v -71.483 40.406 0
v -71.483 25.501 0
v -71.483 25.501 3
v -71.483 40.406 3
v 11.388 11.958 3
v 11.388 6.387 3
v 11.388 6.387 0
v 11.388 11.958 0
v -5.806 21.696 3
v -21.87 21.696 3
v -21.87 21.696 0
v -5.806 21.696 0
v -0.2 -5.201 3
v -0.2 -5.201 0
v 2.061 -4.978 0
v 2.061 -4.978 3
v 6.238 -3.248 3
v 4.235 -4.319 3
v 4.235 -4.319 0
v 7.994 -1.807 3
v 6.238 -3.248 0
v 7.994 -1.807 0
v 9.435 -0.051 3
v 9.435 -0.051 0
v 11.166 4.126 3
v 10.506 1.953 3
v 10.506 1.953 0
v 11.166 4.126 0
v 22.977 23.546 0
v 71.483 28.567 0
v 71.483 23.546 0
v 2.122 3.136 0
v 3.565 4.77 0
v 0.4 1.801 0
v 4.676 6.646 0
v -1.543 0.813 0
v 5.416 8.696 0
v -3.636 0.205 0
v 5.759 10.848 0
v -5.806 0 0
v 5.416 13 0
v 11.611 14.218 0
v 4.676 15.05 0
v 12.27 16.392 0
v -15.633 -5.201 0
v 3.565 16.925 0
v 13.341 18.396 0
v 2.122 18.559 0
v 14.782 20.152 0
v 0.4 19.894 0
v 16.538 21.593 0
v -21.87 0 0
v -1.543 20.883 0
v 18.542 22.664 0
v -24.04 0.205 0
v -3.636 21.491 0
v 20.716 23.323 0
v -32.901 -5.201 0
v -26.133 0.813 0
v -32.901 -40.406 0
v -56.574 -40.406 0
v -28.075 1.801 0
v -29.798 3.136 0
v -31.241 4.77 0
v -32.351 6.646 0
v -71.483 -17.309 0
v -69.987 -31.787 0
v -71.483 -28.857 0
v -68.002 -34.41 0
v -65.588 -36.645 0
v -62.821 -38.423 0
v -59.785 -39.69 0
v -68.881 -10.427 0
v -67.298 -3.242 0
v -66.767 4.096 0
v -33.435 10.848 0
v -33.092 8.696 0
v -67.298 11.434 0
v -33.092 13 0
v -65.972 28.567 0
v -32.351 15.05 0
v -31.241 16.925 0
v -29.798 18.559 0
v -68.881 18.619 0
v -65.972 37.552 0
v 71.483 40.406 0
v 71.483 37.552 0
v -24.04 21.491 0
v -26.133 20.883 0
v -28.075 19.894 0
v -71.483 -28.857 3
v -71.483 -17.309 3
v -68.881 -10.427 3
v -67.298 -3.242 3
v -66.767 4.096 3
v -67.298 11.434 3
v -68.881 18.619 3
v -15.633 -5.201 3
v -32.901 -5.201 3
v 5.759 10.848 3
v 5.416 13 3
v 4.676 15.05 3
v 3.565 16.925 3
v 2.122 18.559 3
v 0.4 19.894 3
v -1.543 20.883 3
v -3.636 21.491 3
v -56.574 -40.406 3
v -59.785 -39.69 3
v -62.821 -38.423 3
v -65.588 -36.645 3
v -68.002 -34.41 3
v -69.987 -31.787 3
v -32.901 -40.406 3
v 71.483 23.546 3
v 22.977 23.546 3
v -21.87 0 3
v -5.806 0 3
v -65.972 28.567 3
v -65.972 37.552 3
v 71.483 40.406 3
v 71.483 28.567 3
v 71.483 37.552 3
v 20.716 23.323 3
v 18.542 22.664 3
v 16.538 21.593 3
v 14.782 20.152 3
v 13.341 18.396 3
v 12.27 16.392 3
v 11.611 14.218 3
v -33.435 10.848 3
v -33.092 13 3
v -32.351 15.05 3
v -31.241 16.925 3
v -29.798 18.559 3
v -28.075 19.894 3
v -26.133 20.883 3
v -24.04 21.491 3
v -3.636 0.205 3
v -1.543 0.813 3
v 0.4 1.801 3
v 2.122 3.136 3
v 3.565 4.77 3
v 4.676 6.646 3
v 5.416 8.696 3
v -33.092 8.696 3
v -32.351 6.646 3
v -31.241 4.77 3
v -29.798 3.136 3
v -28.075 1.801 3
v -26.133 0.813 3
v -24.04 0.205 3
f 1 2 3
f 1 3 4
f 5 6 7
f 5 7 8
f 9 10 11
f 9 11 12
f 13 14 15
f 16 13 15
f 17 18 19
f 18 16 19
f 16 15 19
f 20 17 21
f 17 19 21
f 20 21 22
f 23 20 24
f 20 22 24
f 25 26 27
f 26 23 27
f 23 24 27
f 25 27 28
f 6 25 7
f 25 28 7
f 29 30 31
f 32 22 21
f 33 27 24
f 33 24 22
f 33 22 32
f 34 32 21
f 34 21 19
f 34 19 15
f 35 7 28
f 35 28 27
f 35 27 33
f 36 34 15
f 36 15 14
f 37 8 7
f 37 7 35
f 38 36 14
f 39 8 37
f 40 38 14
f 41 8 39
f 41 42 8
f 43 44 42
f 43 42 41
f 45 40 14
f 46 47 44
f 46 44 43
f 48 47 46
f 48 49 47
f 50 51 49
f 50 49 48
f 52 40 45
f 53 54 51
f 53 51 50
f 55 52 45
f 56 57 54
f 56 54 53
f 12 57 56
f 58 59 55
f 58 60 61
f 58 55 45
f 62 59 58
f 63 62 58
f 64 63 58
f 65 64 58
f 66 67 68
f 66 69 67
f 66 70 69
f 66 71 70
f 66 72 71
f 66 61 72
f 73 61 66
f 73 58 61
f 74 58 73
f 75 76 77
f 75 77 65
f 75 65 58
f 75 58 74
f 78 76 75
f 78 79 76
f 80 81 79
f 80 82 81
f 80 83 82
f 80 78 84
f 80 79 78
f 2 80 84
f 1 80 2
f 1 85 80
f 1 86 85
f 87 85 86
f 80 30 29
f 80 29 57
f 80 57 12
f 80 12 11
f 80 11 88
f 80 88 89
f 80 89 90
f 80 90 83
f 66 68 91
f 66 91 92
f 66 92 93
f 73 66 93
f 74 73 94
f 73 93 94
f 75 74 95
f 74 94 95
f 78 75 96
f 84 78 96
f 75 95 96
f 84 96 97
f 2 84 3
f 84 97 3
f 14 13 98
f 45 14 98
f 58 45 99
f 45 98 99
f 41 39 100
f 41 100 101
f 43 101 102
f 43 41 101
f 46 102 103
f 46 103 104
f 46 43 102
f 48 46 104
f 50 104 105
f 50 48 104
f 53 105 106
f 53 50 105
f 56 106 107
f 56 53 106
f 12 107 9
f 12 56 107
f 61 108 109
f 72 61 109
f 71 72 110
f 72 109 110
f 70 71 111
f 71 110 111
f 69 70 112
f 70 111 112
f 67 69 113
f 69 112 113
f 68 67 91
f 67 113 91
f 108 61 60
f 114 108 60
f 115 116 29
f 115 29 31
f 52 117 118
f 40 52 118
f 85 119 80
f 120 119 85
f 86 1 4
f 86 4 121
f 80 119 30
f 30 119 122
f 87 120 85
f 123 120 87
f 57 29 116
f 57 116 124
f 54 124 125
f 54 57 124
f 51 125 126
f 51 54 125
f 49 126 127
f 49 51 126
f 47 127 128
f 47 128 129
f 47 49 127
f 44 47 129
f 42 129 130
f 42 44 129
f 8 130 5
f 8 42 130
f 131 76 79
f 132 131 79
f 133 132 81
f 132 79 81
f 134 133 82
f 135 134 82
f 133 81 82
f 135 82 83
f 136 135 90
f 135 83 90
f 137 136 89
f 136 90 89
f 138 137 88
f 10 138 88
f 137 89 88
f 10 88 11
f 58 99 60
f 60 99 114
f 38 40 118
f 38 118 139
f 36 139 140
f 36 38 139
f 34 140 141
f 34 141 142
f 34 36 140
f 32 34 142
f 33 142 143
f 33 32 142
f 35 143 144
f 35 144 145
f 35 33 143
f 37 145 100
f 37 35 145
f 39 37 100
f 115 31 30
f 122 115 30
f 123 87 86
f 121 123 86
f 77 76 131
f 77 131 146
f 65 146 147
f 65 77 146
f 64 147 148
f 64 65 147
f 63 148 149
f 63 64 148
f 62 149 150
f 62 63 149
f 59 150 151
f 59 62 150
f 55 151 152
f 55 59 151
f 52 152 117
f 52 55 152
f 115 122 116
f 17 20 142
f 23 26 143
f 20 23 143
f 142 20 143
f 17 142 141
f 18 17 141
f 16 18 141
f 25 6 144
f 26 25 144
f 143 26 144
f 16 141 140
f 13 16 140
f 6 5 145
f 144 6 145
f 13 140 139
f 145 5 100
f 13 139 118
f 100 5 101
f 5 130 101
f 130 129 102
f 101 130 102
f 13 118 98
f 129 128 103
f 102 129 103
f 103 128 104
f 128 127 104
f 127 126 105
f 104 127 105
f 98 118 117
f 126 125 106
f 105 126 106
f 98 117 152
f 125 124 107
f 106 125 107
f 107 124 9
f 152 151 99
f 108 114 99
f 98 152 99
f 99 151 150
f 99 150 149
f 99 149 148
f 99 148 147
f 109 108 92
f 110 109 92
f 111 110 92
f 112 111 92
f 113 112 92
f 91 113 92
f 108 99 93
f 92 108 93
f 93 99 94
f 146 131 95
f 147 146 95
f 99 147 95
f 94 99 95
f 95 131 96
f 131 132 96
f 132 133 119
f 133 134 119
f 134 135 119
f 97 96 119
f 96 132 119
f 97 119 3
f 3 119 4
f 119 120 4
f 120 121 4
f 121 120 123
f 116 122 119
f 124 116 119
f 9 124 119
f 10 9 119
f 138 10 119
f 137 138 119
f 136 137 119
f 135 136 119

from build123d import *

# Parameters (mm, degrees)
F0_W         = 142.9656147957
F0_H         = 80.8112323284
F1_DEPTH     = 3
F2_W         = 137.4550536275
F2_H         = 8.9848991483
F2_W_2       = 60.0944850594
F2_H_2       = 18.4983238578
F3_DEPTH     = 52.3
F4_W         = 39.2408655025
F4_H         = 21.6958951205
F5_DEPTH     = 25
F6_W         = 3.3521875739
F6_H         = 44.7733802721
F6_W_2       = 40.9712046385
F7_DEPTH     = 25
F8_W         = 102.604271844
F8_H         = 18.422623165
F9_DEPTH     = 25
F10_T1_DEPTH = 3
F10_T3_DEPTH = 60.941125497
F12_DEPTH    = 25
F14_DEPTH    = 25
F16_DEPTH    = 25


# Not quite as in the source:
# - a fillet or chamfer that OpenCascade refuses, or shapes differently, is made with other operations: its cross-section is extruded or revolved along the edge and cut away or added


with BuildPart() as f1:
    # F0 (on Top) → F1 (new body)
    with BuildSketch(Plane.XY):
        Rectangle(F0_W, F0_H)
    extrude(amount=F1_DEPTH)

    # F2 (on face) → F3 (cut)
    with BuildSketch(Plane.XY.offset(3)):
        with Locations((2.7552805841, 33.0591509119)):
            Rectangle(F2_W, F2_H)
        with Locations((41.4355648682, 14.2965670675)):
            Rectangle(F2_W_2, F2_H_2)
    extrude(amount=-F3_DEPTH, mode=Mode.SUBTRACT)

    # F4 (on face) → F5 (cut)
    with BuildSketch(Plane.XY.offset(3)):
        with Locations((-13.8379565906, 10.8479475603)):
            Rectangle(F4_W, F4_H)
    extrude(amount=-F5_DEPTH, mode=Mode.SUBTRACT)

    # F6 (on face) → F7 (cut)
    with BuildSketch(Plane.XY.offset(3)):
        Polygon((98.6725464463, 0), (13.7504395097, 0), (13.7504395097, -5.2010240033), (17.1026270837, -5.2010240033), (17.1026270837, -49.9744042754), (13.7504395097, -49.9744042754), (13.7504395097, -55.2418604493), (98.6725464463, -55.2418604493), align=None)
        with Locations((15.4265332967, -27.5877141394)):
            Rectangle(F6_W, F6_H)
        with Locations((-6.7351628095, -27.5877141394)):
            Rectangle(F6_W_2, F6_H)
    extrude(amount=-F7_DEPTH, mode=Mode.SUBTRACT)

    # F8 (on face) → F9 (cut)
    with BuildSketch(Plane.XY.offset(3)):
        with Locations((62.6904582605, -4.1639064439)):
            Rectangle(F8_W, F8_H)
    extrude(amount=-F9_DEPTH, mode=Mode.SUBTRACT)

    # F10: fillet of radius 11.5882250994 on 7 edges, made by hand

    # F10_s2 → F10_t1 (join)
    with BuildSketch(Plane.XY):
        with BuildLine():
            ThreePointArc((22.9765474379, 23.5457289964), (14.7824348882, 20.1516164467), (11.3883223385, 11.957503897))
            Line((11.3883223385, 11.957503897), (11.3883223385, 23.5457289964))
            Line((11.3883223385, 23.5457289964), (22.9765474379, 23.5457289964))
        make_face()
        with BuildLine():
            ThreePointArc((-15.6325400293, -5.2010240033), (-23.826652579, -8.595136553), (-27.2207651287, -16.7892491027))
            Line((-27.2207651287, -16.7892491027), (-27.2207651287, -5.2010240033))
            Line((-27.2207651287, -5.2010240033), (-15.6325400293, -5.2010240033))
        make_face()
        with BuildLine():
            ThreePointArc((-33.4583893418, 10.1076700211), (-30.0642767921, 18.3017825708), (-21.8701642424, 21.6958951205))
            Line((-21.8701642424, 21.6958951205), (-33.4583893418, 21.6958951205))
            Line((-33.4583893418, 21.6958951205), (-33.4583893418, 10.1076700211))
        make_face()
        with BuildLine():
            ThreePointArc((-5.8057489387, 0), (2.388363611, 3.3941125497), (5.7824761607, 11.5882250994))
            Line((5.7824761607, 11.5882250994), (5.7824761607, 0))
            Line((5.7824761607, 0), (-5.8057489387, 0))
        make_face()
        with BuildLine():
            ThreePointArc((-33.4583893418, 11.5882250994), (-30.0642767921, 3.3941125497), (-21.8701642424, 0))
            Line((-21.8701642424, 0), (-33.4583893418, 0))
            Line((-33.4583893418, 0), (-33.4583893418, 11.5882250994))
        make_face()
        with BuildLine():
            ThreePointArc((5.7824761607, 10.1076700211), (2.388363611, 18.3017825708), (-5.8057489387, 21.6958951205))
            Line((-5.8057489387, 21.6958951205), (5.7824761607, 21.6958951205))
            Line((5.7824761607, 21.6958951205), (5.7824761607, 10.1076700211))
        make_face()
    extrude(amount=F10_T1_DEPTH)

    # F10_s4 → F10_t3 (cut)
    with BuildSketch(Plane.XY.offset(-28.9705627485)):
        with BuildLine():
            ThreePointArc((-0.1999027609, -5.2010240033), (7.9942097888, -1.8069114536), (11.3883223385, 6.3872010961))
            Line((11.3883223385, 6.3872010961), (11.3883223385, -5.2010240033))
            Line((11.3883223385, -5.2010240033), (-0.1999027609, -5.2010240033))
        make_face()
    extrude(amount=F10_T3_DEPTH, mode=Mode.SUBTRACT)

    # F11 (on face) → F12 (cut)
    with BuildSketch(Plane.XY.offset(3)):
        with BuildLine():
            Line((-71.4828073978, 25.5012605339), (-71.4828073978, -17.3091441393))
            ThreePointArc((-71.4828073978, -17.3091441393), (-66.7668008007, 4.0960581973), (-71.4828073978, 25.5012605339))
        make_face()
    extrude(amount=-F12_DEPTH, mode=Mode.SUBTRACT)

    # F13 (on face) → F14 (cut)
    with BuildSketch(Plane.XY.offset(3)):
        with BuildLine():
            ThreePointArc((-21.3245461018, -6.6952891353), (-30.1185964093, -13.4662376926), (-27.2207651287, -24.1799503565))
            Line((-27.2207651287, -24.1799503565), (-27.2207651287, -16.7892491027))
            ThreePointArc((-27.2207651287, -16.7892491027), (-25.6387183355, -10.944306275), (-21.3245461018, -6.6952891353))
        make_face()
        with BuildLine():
            ThreePointArc((-27.2207651287, -32.8327932205), (-29.4171017882, -37.101902666), (-32.9005867243, -40.4056161642))
            Line((-32.9005867243, -40.4056161642), (-27.2207651287, -40.4056161642))
            Line((-27.2207651287, -40.4056161642), (-27.2207651287, -32.8327932205))
        make_face()
        with BuildLine():
            ThreePointArc((-56.574376872, -40.4056161642), (-65.5880780241, -36.6447482344), (-71.4828073978, -28.8573801517))
            Line((-71.4828073978, -28.8573801517), (-71.4828073978, -40.4056161642))
            Line((-71.4828073978, -40.4056161642), (-56.574376872, -40.4056161642))
        make_face()
    extrude(amount=-F14_DEPTH, mode=Mode.SUBTRACT)

    # F15 (on face) → F16 (cut)
    with BuildSketch(Plane.XY.offset(3)):
        with BuildLine():
            Line((-32.9005867243, -5.2010240033), (-32.9005867243, -40.4056161642))
            ThreePointArc((-32.9005867243, -40.4056161642), (-29.4171017882, -37.101902666), (-27.2207651287, -32.8327932205))
            Line((-27.2207651287, -32.8327932205), (-27.2207651287, -24.1799503565))
            ThreePointArc((-27.2207651287, -24.1799503565), (-30.1185964093, -13.4662376926), (-21.3245461018, -6.6952891353))
            ThreePointArc((-21.3245461018, -6.6952891353), (-18.5749778542, -5.5808138595), (-15.6325400293, -5.2010240033))
            Line((-15.6325400293, -5.2010240033), (-32.9005867243, -5.2010240033))
        make_face()
    extrude(amount=-F16_DEPTH, mode=Mode.SUBTRACT)


solid = f1.part
